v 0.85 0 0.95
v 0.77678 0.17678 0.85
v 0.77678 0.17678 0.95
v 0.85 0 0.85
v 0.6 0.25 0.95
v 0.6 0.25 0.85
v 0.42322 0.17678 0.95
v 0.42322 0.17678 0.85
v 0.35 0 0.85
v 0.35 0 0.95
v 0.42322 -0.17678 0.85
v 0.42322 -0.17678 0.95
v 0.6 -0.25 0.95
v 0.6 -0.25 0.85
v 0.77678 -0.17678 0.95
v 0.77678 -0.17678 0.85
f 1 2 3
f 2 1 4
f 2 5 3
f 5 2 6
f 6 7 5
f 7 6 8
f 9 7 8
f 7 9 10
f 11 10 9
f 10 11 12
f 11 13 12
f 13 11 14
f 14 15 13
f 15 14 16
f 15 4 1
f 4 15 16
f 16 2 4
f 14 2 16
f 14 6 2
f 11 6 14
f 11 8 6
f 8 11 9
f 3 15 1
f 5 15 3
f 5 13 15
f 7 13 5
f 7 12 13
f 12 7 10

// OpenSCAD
// file: lib.scad
function x(v) = v[0];
function y(v) = v[1];
function z(v) = v[2];
function add(v1,v2) = [ for (i = [ 0 : len(v1)-1 ]) v1[i] + v2[i] ];
function xv(d) = [d,0,0];
function yv(d) = [0,d,0];
function zv(d) = [0,0,d];

module box(v) { cube(size=v, center=true); }
module cyl(r1,r2,h) { cylinder(r1=r1, r2=r2, h=h, center=true); }

function grow(n,v) = [x(v)+n*2, y(v)+n*2, z(v)+n*2];

module rbox(v, radius=1) {
	cx = x(v)/2-radius;
	cy = y(v)/2-radius;
	cz = z(v)/2-radius;

	hull() {
		translate([cx,cy,cz]) sphere(r=radius);
		translate([cx,cy,-cz]) sphere(r=radius);
		translate([cx,-cy,cz]) sphere(r=radius);
		translate([cx,-cy,-cz]) sphere(r=radius);
		translate([-cx,cy,cz]) sphere(r=radius);
		translate([-cx,cy,-cz]) sphere(r=radius);
		translate([-cx,-cy,cz]) sphere(r=radius);
		translate([-cx,-cy,-cz]) sphere(r=radius);
	}
}

module fillet(r=1) {
  minkowski() {
    difference() {
      children();
      minkowski() {
        difference() {
          minkowski() {
            children();
            sphere(r=r);
          }
          children();
        }
        sphere(r=r);
      }
    }
    sphere(r=r);
  }
}
// main file
use <lib.scad>

module rivet() {
	union() {
		translate([0,0,0.005]) sphere(0.019);
		translate([0,0,-0.015]) cyl(0.025, 0.025, 0.05);
	}
}

module flange() {
	rotate([0,90,0]) difference() {
		cyl(0.85,0.85,0.1);
		difference() {
			cyl(0.9,0.9,0.01);
			cyl(0.82,0.82,0.05);
		}
	}
}

module firebox() {
	union() {
		hull() {
			translate([1.1,0,0]) rotate([0,90,0]) rotate_extrude(convexity=10) translate([0.6,0,0]) circle(r=0.2);
			translate([-1.1,0,0]) rotate([0,90,0]) rotate_extrude(convexity=10) translate([0.6,0,0]) circle(r=0.2);
		}
		translate([1.1,0,0]) flange();
		translate([-1.1,0,0]) flange();
		//for (i=[0:1:11]) translate([1.3,0,0]) rotate([i*30,0,0]) translate([0,0,0.55]) rotate([0,90,0]) rivet();
		//for (i=[0:1:11]) translate([-1.3,0,0]) rotate([i*30,0,0]) translate([0,0,0.55]) rotate([0,-90,0]) rivet();
		//for (i=[0:1:17]) translate([0.9,0,0]) rotate([i*20,0,0]) translate([0,0,0.8]) rivet();
		//for (i=[0:1:17]) translate([-0.9,0,0]) rotate([i*20,0,0]) translate([0,0,0.8]) rivet();
		//for (i=[0:1:17]) translate([0.3,0,0]) rotate([i*20,0,0]) translate([0,0,0.8]) rivet();
		//for (i=[0:1:17]) translate([-0.3,0,0]) rotate([i*20,0,0]) translate([0,0,0.8]) rivet();
	}
}

module stack() {
	translate([0.6,0,0.5]) intersection() {
		translate([0,0,-0.5]) union() {
			difference() {
				cyl(0.3,0.3,2.0);
				cyl(0.25,0.25,2.1);
			}
			translate([0,0,0.1]) intersection() {
				rotate([0,90,0]) cyl(0.75,0.75,1.0);
				cyl(0.44,0.44,10);
			}
		}
		box([1,1,1]);
	}
}

module cover() {
	translate([0.6,0,0.9]) cyl(0.25,0.25,0.1);
}

module chassis() {
	translate([0,0,-0.5]) box([2.9,1.9,1.0]);
}

hd=72;
ld=8;

FN=ld;

//chassis($fn=FN);

//difference() {
//	firebox($fn=FN);
//	chassis($fn=FN);
//}

//stack($fn=FN);
cover($fn=FN);
//rivet($fn=FN/4);
